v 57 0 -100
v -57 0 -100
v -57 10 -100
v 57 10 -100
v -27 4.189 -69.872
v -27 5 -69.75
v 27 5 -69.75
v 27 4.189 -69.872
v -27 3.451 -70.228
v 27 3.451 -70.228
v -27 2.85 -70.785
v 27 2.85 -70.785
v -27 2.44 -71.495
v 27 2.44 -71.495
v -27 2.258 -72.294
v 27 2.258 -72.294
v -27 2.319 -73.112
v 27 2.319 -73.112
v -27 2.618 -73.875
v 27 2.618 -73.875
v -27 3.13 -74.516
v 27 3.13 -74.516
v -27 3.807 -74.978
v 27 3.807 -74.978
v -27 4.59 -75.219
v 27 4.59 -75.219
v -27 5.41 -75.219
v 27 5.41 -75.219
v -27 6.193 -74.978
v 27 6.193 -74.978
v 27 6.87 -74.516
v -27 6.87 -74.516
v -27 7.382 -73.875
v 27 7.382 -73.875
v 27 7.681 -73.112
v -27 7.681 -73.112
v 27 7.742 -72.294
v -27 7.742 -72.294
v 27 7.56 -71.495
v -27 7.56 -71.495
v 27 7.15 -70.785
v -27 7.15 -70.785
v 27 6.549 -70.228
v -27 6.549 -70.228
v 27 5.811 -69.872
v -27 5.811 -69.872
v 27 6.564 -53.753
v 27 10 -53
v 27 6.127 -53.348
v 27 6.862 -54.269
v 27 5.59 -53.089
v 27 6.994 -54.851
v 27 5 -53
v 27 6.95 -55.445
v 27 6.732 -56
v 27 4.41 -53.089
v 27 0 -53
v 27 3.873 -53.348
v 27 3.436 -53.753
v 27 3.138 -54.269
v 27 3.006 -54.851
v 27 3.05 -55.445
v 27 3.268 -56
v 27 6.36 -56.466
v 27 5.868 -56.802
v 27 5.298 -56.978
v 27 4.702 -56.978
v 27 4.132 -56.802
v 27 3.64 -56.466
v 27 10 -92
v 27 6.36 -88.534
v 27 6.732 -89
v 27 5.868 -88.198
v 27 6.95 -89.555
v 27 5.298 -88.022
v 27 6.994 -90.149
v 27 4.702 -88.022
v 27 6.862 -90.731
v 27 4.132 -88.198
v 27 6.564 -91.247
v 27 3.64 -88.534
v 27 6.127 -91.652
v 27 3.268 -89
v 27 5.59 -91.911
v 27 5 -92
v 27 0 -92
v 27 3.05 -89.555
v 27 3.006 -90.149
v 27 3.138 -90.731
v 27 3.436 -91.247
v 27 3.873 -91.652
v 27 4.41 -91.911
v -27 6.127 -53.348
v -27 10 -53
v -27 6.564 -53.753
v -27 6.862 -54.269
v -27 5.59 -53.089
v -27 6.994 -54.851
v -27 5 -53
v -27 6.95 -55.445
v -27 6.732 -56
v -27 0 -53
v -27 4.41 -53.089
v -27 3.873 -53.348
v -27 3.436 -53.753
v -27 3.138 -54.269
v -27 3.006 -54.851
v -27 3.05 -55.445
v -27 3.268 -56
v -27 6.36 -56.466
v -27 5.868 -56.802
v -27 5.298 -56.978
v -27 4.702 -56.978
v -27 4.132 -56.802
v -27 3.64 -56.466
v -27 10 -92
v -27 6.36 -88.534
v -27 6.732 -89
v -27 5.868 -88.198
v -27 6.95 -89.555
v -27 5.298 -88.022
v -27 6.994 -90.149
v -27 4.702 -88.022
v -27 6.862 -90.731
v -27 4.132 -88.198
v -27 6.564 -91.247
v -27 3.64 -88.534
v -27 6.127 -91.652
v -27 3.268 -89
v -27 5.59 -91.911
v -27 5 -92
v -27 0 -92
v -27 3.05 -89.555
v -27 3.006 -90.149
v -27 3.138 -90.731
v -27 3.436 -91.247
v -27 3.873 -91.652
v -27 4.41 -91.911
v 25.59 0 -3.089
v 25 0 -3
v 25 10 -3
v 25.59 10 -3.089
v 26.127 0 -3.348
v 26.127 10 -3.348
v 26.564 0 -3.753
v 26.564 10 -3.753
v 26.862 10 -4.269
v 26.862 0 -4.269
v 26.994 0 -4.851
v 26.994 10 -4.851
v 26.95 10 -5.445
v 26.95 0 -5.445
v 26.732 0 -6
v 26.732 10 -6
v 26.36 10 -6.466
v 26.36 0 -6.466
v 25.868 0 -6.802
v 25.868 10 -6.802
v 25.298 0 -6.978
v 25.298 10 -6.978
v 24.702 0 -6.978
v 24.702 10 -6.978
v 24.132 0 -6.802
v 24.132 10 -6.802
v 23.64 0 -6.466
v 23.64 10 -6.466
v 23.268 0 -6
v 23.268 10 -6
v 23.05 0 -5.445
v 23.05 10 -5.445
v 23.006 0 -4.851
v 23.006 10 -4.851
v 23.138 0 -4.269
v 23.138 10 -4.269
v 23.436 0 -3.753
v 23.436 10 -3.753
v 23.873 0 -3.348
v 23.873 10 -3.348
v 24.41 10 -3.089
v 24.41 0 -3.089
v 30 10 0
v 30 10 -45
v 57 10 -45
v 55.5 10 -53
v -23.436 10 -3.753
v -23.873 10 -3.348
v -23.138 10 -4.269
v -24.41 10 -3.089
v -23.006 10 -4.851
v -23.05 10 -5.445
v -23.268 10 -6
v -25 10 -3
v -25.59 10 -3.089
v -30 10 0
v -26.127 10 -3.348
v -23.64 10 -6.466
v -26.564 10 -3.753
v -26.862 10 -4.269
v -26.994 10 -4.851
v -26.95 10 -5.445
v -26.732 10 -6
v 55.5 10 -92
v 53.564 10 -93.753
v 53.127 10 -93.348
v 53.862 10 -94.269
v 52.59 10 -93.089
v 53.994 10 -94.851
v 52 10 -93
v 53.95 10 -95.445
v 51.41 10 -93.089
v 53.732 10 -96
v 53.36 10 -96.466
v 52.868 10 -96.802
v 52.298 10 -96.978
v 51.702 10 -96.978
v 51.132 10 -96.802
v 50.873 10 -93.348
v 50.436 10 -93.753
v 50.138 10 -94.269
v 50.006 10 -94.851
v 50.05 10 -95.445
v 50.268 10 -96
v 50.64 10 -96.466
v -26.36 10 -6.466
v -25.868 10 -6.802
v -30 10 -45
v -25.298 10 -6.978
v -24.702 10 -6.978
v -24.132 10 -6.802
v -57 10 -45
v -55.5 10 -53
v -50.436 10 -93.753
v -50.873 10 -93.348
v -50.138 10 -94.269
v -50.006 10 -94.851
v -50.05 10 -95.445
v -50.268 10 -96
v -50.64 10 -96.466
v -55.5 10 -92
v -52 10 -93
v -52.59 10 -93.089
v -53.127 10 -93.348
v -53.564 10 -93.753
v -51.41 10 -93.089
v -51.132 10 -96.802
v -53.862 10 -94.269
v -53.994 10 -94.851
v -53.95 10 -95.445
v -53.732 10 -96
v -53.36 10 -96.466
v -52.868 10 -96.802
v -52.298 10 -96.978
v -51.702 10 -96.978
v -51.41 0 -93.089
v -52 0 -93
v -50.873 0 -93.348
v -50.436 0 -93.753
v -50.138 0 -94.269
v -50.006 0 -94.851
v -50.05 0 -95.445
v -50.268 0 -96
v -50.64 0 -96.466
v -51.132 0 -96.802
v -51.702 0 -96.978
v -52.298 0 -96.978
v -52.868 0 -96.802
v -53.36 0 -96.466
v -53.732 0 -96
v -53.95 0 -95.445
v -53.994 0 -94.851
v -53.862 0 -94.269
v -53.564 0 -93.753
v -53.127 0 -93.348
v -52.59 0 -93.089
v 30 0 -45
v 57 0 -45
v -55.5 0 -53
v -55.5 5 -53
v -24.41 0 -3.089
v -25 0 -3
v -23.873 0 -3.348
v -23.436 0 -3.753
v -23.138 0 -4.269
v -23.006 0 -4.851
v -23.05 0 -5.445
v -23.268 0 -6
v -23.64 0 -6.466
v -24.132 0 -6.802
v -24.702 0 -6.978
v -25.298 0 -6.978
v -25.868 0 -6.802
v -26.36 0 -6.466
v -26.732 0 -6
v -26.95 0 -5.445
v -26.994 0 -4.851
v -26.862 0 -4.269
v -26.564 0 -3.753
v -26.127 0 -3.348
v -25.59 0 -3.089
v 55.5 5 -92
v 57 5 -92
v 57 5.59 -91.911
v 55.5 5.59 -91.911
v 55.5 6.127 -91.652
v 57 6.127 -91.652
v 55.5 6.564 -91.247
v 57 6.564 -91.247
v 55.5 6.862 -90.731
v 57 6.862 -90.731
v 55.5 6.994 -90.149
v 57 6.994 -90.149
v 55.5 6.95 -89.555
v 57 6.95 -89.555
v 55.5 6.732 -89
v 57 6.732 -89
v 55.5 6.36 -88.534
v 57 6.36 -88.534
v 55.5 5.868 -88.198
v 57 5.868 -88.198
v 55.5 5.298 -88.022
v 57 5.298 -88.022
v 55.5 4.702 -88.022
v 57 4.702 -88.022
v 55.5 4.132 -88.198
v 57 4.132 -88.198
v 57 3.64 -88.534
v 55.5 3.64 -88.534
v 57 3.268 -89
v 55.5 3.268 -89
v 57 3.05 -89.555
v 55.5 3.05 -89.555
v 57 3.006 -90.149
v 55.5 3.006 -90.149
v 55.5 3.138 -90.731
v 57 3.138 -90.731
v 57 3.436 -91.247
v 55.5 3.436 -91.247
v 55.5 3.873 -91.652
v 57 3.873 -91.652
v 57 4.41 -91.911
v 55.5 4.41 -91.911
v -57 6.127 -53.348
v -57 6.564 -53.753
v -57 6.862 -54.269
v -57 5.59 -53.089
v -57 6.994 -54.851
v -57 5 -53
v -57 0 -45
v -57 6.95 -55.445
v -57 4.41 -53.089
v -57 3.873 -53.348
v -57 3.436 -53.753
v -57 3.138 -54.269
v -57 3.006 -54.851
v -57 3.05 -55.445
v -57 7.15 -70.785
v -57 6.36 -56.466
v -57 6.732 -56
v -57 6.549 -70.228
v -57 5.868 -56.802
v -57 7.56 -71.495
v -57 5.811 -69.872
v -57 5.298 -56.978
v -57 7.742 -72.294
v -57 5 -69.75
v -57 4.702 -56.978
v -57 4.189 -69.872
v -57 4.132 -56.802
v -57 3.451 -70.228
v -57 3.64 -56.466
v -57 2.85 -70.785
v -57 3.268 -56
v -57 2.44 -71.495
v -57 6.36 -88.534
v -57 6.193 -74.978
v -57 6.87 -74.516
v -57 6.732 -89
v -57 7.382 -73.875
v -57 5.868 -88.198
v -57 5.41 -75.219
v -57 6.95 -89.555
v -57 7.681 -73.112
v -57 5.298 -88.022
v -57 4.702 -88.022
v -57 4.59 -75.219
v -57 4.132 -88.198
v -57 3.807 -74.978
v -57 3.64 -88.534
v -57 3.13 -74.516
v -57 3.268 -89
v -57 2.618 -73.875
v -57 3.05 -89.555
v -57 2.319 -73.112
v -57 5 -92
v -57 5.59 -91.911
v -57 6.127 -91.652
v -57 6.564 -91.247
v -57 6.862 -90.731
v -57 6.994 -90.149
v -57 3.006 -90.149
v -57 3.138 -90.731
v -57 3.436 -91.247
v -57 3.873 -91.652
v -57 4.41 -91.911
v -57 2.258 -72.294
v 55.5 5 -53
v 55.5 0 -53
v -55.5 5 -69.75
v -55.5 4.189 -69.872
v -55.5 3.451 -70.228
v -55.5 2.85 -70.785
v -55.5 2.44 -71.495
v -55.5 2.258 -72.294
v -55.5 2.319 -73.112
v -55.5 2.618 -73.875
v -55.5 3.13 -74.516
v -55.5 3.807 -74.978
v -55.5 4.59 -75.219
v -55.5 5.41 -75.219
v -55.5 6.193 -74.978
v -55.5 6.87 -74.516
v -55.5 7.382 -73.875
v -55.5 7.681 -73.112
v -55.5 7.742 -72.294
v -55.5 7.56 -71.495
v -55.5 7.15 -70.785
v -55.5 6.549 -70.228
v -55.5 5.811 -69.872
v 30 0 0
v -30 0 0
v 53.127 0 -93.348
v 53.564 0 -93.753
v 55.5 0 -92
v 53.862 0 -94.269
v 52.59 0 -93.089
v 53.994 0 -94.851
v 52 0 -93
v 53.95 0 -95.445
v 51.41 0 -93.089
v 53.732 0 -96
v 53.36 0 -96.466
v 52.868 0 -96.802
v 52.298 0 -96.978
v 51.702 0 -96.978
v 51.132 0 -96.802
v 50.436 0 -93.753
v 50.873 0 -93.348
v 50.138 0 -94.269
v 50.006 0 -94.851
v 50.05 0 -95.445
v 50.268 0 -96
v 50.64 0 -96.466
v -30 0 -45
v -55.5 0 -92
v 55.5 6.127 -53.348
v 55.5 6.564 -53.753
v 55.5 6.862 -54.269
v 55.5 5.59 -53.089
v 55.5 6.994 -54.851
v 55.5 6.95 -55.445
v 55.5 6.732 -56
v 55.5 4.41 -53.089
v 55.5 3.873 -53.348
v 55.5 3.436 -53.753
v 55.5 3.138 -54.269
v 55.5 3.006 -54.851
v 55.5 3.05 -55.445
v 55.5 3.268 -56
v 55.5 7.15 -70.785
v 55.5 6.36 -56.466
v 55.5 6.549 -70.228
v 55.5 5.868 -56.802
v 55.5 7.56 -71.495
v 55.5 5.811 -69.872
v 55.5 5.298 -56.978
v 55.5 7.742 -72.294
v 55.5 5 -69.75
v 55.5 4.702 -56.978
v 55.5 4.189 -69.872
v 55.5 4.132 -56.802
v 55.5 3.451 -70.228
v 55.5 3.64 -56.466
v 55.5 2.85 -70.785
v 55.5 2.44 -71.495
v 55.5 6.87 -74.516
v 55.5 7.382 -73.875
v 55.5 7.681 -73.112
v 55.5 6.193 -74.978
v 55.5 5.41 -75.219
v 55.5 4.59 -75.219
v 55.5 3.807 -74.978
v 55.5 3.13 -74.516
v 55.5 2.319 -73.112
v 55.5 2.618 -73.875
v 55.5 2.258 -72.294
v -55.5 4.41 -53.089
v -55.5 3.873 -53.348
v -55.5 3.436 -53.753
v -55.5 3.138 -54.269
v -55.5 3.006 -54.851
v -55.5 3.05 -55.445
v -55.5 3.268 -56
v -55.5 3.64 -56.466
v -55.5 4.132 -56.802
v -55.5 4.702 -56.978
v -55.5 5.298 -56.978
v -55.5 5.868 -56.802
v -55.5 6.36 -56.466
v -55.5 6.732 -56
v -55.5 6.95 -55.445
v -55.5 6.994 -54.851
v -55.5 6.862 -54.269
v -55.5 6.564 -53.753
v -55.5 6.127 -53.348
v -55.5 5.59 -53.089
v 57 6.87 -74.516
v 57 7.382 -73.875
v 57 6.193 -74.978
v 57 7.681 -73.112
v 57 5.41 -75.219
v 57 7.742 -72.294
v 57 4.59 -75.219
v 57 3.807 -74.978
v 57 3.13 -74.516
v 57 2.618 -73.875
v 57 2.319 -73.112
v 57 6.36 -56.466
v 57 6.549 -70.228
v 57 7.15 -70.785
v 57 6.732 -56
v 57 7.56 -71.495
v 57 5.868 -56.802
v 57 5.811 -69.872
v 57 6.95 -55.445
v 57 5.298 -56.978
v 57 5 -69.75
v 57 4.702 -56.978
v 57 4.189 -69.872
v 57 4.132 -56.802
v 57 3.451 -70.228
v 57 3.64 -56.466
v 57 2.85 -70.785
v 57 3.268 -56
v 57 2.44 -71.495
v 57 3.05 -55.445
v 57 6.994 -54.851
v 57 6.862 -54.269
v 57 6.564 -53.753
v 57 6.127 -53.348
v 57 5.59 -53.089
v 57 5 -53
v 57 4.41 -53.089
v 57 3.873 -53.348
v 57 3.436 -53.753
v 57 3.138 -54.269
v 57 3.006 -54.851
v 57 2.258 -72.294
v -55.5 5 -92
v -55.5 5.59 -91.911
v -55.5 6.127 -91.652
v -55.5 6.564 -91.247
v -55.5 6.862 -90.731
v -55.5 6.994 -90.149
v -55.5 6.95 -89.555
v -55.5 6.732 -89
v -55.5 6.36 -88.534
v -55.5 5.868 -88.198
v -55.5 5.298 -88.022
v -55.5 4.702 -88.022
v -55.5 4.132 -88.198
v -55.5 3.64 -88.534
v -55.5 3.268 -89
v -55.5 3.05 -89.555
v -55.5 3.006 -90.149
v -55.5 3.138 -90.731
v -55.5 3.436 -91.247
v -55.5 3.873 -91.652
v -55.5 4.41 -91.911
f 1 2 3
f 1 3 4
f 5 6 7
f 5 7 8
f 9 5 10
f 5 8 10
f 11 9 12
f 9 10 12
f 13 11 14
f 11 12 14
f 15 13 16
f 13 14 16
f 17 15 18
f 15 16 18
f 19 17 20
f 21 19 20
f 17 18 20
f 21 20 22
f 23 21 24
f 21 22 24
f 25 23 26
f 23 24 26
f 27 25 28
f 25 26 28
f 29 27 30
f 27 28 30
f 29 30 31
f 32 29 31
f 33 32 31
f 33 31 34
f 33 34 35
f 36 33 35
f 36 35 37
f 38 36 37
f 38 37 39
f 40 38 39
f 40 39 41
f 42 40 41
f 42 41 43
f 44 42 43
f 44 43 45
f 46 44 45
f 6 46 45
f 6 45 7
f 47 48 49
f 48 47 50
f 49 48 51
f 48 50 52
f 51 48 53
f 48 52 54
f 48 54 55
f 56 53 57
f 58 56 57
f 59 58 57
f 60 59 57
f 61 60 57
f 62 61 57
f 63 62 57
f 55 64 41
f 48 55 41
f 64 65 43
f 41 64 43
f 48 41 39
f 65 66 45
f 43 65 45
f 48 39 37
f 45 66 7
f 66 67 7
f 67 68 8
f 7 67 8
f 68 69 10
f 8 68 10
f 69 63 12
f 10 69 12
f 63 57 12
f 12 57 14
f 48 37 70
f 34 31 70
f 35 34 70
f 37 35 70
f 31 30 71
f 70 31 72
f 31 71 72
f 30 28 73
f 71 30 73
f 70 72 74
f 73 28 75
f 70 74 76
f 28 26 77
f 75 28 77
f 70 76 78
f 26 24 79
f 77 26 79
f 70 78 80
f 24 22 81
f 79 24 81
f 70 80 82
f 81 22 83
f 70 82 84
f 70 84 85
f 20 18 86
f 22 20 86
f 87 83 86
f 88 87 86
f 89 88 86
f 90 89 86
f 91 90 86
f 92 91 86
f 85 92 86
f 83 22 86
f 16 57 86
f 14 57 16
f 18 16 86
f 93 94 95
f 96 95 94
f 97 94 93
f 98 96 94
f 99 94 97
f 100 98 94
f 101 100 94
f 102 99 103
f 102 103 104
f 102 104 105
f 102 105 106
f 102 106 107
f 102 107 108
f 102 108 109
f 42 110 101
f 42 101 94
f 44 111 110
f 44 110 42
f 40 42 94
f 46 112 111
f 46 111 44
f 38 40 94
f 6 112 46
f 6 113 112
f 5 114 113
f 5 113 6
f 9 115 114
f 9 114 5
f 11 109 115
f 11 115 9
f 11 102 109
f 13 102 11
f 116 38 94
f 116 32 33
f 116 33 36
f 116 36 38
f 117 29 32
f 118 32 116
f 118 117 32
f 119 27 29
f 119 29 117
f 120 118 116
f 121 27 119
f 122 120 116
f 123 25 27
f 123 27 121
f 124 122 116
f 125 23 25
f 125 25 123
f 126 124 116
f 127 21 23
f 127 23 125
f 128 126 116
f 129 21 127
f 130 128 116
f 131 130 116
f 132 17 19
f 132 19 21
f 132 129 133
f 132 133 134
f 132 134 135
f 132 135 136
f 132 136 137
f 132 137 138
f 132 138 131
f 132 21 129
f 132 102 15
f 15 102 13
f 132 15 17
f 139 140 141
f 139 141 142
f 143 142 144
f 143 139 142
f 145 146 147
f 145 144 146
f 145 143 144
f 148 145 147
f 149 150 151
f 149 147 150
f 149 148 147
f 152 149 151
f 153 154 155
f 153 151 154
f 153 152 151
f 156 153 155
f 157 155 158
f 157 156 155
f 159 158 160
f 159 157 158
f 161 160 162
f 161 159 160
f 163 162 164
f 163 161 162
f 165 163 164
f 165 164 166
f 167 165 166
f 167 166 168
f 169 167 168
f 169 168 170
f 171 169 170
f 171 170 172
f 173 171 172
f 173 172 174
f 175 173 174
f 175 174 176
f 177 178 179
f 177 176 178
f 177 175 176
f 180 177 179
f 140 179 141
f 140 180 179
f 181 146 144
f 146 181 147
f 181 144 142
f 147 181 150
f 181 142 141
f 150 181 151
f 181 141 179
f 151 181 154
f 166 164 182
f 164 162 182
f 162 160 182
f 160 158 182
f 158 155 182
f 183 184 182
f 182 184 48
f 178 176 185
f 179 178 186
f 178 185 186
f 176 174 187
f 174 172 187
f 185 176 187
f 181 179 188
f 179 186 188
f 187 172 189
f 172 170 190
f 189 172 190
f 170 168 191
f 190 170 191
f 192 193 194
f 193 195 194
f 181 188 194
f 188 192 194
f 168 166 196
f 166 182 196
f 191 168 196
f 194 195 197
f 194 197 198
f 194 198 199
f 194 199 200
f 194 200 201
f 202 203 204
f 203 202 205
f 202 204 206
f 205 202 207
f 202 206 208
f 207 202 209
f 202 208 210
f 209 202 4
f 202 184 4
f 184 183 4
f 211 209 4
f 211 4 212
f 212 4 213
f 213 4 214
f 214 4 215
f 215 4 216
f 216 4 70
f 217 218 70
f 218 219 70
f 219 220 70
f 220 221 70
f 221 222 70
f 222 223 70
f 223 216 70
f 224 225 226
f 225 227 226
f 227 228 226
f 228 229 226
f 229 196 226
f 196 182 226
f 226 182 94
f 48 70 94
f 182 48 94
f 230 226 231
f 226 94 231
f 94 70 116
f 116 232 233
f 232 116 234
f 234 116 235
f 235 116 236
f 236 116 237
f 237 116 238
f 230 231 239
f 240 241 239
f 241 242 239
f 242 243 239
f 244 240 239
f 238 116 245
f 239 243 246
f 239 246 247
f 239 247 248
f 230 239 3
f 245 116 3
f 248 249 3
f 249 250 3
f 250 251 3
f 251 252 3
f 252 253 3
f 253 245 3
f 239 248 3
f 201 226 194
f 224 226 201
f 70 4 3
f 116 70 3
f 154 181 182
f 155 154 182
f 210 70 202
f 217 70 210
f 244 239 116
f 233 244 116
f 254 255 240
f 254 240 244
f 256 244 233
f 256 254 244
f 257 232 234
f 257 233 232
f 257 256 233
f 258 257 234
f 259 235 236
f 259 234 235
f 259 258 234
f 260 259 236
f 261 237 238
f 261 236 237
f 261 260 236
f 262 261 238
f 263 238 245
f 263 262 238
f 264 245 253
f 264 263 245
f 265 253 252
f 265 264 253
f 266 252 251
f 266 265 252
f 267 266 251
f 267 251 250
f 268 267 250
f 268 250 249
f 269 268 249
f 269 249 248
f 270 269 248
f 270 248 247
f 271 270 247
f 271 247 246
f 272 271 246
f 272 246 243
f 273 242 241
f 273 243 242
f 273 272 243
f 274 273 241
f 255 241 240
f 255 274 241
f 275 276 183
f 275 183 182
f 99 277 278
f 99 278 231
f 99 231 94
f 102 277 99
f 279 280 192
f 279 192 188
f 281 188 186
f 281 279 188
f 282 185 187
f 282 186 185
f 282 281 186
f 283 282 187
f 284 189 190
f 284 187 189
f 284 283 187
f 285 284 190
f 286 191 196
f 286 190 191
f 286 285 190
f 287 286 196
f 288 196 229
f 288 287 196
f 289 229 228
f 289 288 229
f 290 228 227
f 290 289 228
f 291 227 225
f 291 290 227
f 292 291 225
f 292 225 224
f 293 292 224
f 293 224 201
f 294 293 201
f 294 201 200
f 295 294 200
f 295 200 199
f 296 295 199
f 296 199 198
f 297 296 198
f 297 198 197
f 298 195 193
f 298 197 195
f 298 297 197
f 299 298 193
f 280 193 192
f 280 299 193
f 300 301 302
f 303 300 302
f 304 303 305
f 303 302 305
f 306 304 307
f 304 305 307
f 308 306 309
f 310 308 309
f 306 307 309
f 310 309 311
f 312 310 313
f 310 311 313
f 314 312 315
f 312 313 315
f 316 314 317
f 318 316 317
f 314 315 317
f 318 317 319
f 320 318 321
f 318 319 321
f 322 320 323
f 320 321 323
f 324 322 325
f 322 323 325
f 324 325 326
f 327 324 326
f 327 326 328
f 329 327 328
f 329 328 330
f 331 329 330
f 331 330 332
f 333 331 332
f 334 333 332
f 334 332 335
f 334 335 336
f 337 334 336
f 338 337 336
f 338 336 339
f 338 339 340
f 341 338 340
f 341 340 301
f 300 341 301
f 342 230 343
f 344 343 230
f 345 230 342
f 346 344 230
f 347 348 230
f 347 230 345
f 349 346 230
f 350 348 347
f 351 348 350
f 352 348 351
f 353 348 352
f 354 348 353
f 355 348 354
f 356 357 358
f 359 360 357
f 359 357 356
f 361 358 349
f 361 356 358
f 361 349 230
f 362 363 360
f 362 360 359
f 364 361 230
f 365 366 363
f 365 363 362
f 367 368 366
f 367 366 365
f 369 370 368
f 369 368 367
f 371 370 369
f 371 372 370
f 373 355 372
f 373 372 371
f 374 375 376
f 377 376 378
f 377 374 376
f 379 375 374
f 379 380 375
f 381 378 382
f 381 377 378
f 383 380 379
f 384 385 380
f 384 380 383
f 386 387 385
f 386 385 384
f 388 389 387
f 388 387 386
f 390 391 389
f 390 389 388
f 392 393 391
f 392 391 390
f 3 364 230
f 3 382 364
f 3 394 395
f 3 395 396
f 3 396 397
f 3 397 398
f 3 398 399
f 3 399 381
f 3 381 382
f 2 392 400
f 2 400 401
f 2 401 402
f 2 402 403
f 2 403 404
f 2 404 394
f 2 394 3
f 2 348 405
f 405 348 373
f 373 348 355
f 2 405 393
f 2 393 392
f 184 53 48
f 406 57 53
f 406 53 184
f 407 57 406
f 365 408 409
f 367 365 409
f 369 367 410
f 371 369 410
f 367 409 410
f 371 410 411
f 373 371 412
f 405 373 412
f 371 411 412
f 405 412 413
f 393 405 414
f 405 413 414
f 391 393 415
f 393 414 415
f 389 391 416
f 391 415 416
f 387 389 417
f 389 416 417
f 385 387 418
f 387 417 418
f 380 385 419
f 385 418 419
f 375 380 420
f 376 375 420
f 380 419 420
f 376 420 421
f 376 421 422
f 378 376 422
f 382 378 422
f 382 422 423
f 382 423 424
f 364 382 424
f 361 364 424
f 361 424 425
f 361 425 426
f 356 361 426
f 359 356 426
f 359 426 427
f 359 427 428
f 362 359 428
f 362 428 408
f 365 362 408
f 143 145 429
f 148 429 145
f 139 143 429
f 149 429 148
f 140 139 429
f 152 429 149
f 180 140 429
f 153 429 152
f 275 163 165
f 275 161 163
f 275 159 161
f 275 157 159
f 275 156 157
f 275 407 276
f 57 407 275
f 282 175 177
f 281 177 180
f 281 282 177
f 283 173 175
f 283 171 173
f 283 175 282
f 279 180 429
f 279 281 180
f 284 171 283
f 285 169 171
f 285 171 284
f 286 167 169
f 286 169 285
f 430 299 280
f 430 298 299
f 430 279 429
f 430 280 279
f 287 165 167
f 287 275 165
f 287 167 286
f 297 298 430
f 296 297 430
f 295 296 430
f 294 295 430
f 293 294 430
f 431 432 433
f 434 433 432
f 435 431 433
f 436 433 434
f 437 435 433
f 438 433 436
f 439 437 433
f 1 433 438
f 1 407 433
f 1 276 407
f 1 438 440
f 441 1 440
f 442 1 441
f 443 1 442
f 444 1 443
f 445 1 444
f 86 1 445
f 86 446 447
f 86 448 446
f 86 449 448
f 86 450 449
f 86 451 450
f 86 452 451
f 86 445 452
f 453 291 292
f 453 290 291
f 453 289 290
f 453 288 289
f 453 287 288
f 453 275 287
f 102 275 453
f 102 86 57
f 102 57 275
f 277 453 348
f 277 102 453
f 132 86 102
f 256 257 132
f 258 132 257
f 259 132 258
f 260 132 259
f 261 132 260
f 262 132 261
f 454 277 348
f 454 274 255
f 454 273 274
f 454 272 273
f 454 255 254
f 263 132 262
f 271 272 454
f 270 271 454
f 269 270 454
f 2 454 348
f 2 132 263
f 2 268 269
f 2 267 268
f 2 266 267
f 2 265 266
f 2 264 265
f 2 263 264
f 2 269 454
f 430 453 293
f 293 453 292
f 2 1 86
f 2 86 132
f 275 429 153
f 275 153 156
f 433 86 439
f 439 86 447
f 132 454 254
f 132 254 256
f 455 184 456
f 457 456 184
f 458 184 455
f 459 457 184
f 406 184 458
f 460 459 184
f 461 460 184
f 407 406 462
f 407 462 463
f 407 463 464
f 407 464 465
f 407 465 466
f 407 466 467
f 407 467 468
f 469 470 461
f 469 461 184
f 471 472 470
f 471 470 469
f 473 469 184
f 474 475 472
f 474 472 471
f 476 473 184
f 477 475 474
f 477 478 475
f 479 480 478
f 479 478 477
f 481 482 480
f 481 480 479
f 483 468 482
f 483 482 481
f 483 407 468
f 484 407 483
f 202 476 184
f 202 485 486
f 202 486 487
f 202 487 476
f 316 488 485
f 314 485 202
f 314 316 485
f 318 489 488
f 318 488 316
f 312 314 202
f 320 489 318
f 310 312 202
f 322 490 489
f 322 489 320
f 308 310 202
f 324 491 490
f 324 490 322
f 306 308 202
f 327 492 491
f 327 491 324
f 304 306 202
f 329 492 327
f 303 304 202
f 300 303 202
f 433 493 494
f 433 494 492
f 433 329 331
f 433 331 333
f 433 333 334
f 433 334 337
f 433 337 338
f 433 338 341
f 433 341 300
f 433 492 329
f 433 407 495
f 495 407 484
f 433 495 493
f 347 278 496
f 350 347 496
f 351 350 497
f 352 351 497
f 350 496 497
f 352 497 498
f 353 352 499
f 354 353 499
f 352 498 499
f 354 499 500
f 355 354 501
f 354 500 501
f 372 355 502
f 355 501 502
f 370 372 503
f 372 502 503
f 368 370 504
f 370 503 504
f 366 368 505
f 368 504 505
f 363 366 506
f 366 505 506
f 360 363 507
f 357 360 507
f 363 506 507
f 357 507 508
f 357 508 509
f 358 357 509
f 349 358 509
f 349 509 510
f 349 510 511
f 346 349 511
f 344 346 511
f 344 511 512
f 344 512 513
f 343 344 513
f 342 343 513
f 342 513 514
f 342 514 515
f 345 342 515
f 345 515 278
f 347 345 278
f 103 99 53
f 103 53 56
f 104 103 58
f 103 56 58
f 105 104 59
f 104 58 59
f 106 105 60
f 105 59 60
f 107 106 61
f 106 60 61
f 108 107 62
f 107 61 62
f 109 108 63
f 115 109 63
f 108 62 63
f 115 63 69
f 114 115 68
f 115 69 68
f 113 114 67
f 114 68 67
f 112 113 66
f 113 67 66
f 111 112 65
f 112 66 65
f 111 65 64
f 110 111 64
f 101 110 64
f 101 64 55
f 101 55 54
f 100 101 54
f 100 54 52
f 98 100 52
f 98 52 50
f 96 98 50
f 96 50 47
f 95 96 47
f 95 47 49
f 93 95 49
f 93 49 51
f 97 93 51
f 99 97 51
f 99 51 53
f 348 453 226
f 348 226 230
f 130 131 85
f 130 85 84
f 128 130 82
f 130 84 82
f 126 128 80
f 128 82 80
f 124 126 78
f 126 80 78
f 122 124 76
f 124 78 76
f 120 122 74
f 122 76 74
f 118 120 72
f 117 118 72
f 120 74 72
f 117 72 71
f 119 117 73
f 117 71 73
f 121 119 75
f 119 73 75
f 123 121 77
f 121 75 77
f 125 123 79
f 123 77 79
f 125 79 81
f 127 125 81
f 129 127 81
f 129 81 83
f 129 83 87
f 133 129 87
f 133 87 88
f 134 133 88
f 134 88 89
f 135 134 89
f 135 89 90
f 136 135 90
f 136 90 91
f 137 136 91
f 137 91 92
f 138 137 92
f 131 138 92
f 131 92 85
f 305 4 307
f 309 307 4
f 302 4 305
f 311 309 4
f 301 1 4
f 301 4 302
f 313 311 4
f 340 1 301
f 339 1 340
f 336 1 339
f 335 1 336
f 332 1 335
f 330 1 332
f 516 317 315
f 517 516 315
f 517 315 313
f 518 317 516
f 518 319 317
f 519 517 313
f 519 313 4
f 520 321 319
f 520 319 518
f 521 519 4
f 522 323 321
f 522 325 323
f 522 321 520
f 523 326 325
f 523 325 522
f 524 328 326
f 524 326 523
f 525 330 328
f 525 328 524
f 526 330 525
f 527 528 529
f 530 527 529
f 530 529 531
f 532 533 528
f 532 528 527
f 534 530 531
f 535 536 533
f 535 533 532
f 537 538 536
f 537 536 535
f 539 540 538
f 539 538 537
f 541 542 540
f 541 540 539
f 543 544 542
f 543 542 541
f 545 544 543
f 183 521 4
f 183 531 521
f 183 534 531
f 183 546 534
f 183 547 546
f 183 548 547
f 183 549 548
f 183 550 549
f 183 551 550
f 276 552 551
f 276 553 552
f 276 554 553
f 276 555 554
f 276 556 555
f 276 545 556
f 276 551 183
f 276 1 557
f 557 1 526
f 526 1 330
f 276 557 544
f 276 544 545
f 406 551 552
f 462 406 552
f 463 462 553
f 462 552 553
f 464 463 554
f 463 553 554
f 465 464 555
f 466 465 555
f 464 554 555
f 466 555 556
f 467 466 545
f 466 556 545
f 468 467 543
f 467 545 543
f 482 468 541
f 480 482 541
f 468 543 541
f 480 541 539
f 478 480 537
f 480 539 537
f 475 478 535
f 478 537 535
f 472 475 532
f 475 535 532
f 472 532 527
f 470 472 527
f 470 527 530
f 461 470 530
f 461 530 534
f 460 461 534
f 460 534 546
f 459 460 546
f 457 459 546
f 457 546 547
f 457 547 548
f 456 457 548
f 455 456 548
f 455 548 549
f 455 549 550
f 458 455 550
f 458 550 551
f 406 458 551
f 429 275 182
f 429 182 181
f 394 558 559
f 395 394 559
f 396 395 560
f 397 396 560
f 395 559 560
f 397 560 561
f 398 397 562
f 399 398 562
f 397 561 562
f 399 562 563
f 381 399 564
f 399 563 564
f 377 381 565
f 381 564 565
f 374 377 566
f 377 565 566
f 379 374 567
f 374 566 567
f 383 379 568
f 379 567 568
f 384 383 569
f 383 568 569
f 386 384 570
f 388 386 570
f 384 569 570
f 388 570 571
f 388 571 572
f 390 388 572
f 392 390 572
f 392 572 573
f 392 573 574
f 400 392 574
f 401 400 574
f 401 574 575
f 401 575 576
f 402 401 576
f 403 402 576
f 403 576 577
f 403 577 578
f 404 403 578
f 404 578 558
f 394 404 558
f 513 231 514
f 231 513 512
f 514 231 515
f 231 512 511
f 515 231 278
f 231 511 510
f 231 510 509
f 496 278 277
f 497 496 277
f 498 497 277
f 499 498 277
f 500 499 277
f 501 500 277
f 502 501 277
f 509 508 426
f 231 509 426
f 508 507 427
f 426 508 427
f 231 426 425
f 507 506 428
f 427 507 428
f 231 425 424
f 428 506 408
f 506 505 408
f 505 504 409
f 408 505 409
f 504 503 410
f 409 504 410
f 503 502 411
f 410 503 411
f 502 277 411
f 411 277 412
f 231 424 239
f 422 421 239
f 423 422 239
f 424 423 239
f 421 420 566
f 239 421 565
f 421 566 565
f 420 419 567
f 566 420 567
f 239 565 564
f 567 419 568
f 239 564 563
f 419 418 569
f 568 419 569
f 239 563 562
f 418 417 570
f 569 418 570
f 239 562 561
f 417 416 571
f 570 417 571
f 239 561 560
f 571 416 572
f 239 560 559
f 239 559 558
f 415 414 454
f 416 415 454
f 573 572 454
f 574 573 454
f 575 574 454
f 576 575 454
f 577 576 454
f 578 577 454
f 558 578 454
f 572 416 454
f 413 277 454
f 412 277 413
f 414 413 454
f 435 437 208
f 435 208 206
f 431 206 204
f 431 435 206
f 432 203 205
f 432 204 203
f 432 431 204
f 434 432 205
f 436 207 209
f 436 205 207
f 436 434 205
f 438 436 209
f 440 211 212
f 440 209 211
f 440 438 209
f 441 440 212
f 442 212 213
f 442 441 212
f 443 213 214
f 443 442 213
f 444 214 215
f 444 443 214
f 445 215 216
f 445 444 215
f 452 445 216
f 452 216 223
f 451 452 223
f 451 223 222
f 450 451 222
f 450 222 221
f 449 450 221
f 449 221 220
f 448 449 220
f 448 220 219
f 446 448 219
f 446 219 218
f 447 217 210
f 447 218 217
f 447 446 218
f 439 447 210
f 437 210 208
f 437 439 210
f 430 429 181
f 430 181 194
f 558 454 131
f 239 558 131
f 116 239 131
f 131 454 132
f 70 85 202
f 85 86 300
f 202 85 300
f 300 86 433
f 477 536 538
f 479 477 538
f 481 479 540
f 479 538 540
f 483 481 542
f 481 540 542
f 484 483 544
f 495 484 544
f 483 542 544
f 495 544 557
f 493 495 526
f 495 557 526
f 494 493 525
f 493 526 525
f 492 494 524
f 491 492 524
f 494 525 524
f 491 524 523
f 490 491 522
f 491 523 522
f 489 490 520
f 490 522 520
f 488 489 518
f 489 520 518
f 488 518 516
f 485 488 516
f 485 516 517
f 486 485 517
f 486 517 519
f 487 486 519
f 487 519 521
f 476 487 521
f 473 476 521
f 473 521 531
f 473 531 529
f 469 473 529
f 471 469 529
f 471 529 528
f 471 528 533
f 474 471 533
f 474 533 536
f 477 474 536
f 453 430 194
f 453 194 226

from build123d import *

# Parameters (mm, degrees)
BOSS_EXTRUDE1_DEPTH     = 10
CUT_EXTRUDE1_DEPTH      = 116.537872579
CUT_EXTRUDE1_DEPTH_BACK = 116.537872579
SKETCH2_R               = 2
SKETCH2_W               = 28.5
SKETCH2_H               = 39
SKETCH5_R               = 2
SKETCH5_R_2             = 2.75
CUT_EXTRUDE2_DEPTH      = 152.973681932


with BuildPart() as part:
    # Sketch1 → Boss-Extrude1 (new body)
    with BuildSketch(Plane(origin=(0, 0, 0), x_dir=(1, 0, 0), z_dir=(0, 1, 0))):
        Polygon((30, 0), (-30, 0), (-30, 45), (-57, 45), (-57, 100), (57, 100), (57, 45), (30, 45), align=None)
    extrude(amount=BOSS_EXTRUDE1_DEPTH)

    # Sketch2 → Cut-Extrude1 (cut, two sides: drawn at the far end of the back side and taken through both)
    with BuildSketch(Plane(origin=(0, 10, 0), x_dir=(1, 0, 0), z_dir=(0, 1, 0)).offset(-CUT_EXTRUDE1_DEPTH_BACK)):
        with Locations(Location((-52, 95, 0), (0, 0, 270))):
            Circle(SKETCH2_R)
        with Locations(Location((52, 95, 0), (0, 0, 270))):
            Circle(SKETCH2_R)
        with Locations(Location((-25, 5, 0), (0, 0, 270))):
            Circle(SKETCH2_R)
        with Locations(Location((25, 5, 0), (0, 0, 270))):
            Circle(SKETCH2_R)
        with Locations((-41.25, 72.5)):
            Rectangle(SKETCH2_W, SKETCH2_H)
        with Locations((41.25, 72.5)):
            Rectangle(SKETCH2_W, SKETCH2_H)
    extrude(amount=CUT_EXTRUDE1_DEPTH + CUT_EXTRUDE1_DEPTH_BACK, mode=Mode.SUBTRACT)

    # Sketch5 → Cut-Extrude2 (cut, through all)
    with BuildSketch(Plane(origin=(57, 0, 0), x_dir=(0, 0, -1), z_dir=(1, 0, 0))):
        with Locations(Location((55, 5, 0), (0, 0, 180))):
            Circle(SKETCH5_R)
        with Locations((90, 5)):
            Circle(SKETCH5_R)
        with Locations(Location((72.5, 5, 0), (0, 0, 180))):
            Circle(SKETCH5_R_2)
    extrude(amount=-CUT_EXTRUDE2_DEPTH, mode=Mode.SUBTRACT)


solid = part.part
